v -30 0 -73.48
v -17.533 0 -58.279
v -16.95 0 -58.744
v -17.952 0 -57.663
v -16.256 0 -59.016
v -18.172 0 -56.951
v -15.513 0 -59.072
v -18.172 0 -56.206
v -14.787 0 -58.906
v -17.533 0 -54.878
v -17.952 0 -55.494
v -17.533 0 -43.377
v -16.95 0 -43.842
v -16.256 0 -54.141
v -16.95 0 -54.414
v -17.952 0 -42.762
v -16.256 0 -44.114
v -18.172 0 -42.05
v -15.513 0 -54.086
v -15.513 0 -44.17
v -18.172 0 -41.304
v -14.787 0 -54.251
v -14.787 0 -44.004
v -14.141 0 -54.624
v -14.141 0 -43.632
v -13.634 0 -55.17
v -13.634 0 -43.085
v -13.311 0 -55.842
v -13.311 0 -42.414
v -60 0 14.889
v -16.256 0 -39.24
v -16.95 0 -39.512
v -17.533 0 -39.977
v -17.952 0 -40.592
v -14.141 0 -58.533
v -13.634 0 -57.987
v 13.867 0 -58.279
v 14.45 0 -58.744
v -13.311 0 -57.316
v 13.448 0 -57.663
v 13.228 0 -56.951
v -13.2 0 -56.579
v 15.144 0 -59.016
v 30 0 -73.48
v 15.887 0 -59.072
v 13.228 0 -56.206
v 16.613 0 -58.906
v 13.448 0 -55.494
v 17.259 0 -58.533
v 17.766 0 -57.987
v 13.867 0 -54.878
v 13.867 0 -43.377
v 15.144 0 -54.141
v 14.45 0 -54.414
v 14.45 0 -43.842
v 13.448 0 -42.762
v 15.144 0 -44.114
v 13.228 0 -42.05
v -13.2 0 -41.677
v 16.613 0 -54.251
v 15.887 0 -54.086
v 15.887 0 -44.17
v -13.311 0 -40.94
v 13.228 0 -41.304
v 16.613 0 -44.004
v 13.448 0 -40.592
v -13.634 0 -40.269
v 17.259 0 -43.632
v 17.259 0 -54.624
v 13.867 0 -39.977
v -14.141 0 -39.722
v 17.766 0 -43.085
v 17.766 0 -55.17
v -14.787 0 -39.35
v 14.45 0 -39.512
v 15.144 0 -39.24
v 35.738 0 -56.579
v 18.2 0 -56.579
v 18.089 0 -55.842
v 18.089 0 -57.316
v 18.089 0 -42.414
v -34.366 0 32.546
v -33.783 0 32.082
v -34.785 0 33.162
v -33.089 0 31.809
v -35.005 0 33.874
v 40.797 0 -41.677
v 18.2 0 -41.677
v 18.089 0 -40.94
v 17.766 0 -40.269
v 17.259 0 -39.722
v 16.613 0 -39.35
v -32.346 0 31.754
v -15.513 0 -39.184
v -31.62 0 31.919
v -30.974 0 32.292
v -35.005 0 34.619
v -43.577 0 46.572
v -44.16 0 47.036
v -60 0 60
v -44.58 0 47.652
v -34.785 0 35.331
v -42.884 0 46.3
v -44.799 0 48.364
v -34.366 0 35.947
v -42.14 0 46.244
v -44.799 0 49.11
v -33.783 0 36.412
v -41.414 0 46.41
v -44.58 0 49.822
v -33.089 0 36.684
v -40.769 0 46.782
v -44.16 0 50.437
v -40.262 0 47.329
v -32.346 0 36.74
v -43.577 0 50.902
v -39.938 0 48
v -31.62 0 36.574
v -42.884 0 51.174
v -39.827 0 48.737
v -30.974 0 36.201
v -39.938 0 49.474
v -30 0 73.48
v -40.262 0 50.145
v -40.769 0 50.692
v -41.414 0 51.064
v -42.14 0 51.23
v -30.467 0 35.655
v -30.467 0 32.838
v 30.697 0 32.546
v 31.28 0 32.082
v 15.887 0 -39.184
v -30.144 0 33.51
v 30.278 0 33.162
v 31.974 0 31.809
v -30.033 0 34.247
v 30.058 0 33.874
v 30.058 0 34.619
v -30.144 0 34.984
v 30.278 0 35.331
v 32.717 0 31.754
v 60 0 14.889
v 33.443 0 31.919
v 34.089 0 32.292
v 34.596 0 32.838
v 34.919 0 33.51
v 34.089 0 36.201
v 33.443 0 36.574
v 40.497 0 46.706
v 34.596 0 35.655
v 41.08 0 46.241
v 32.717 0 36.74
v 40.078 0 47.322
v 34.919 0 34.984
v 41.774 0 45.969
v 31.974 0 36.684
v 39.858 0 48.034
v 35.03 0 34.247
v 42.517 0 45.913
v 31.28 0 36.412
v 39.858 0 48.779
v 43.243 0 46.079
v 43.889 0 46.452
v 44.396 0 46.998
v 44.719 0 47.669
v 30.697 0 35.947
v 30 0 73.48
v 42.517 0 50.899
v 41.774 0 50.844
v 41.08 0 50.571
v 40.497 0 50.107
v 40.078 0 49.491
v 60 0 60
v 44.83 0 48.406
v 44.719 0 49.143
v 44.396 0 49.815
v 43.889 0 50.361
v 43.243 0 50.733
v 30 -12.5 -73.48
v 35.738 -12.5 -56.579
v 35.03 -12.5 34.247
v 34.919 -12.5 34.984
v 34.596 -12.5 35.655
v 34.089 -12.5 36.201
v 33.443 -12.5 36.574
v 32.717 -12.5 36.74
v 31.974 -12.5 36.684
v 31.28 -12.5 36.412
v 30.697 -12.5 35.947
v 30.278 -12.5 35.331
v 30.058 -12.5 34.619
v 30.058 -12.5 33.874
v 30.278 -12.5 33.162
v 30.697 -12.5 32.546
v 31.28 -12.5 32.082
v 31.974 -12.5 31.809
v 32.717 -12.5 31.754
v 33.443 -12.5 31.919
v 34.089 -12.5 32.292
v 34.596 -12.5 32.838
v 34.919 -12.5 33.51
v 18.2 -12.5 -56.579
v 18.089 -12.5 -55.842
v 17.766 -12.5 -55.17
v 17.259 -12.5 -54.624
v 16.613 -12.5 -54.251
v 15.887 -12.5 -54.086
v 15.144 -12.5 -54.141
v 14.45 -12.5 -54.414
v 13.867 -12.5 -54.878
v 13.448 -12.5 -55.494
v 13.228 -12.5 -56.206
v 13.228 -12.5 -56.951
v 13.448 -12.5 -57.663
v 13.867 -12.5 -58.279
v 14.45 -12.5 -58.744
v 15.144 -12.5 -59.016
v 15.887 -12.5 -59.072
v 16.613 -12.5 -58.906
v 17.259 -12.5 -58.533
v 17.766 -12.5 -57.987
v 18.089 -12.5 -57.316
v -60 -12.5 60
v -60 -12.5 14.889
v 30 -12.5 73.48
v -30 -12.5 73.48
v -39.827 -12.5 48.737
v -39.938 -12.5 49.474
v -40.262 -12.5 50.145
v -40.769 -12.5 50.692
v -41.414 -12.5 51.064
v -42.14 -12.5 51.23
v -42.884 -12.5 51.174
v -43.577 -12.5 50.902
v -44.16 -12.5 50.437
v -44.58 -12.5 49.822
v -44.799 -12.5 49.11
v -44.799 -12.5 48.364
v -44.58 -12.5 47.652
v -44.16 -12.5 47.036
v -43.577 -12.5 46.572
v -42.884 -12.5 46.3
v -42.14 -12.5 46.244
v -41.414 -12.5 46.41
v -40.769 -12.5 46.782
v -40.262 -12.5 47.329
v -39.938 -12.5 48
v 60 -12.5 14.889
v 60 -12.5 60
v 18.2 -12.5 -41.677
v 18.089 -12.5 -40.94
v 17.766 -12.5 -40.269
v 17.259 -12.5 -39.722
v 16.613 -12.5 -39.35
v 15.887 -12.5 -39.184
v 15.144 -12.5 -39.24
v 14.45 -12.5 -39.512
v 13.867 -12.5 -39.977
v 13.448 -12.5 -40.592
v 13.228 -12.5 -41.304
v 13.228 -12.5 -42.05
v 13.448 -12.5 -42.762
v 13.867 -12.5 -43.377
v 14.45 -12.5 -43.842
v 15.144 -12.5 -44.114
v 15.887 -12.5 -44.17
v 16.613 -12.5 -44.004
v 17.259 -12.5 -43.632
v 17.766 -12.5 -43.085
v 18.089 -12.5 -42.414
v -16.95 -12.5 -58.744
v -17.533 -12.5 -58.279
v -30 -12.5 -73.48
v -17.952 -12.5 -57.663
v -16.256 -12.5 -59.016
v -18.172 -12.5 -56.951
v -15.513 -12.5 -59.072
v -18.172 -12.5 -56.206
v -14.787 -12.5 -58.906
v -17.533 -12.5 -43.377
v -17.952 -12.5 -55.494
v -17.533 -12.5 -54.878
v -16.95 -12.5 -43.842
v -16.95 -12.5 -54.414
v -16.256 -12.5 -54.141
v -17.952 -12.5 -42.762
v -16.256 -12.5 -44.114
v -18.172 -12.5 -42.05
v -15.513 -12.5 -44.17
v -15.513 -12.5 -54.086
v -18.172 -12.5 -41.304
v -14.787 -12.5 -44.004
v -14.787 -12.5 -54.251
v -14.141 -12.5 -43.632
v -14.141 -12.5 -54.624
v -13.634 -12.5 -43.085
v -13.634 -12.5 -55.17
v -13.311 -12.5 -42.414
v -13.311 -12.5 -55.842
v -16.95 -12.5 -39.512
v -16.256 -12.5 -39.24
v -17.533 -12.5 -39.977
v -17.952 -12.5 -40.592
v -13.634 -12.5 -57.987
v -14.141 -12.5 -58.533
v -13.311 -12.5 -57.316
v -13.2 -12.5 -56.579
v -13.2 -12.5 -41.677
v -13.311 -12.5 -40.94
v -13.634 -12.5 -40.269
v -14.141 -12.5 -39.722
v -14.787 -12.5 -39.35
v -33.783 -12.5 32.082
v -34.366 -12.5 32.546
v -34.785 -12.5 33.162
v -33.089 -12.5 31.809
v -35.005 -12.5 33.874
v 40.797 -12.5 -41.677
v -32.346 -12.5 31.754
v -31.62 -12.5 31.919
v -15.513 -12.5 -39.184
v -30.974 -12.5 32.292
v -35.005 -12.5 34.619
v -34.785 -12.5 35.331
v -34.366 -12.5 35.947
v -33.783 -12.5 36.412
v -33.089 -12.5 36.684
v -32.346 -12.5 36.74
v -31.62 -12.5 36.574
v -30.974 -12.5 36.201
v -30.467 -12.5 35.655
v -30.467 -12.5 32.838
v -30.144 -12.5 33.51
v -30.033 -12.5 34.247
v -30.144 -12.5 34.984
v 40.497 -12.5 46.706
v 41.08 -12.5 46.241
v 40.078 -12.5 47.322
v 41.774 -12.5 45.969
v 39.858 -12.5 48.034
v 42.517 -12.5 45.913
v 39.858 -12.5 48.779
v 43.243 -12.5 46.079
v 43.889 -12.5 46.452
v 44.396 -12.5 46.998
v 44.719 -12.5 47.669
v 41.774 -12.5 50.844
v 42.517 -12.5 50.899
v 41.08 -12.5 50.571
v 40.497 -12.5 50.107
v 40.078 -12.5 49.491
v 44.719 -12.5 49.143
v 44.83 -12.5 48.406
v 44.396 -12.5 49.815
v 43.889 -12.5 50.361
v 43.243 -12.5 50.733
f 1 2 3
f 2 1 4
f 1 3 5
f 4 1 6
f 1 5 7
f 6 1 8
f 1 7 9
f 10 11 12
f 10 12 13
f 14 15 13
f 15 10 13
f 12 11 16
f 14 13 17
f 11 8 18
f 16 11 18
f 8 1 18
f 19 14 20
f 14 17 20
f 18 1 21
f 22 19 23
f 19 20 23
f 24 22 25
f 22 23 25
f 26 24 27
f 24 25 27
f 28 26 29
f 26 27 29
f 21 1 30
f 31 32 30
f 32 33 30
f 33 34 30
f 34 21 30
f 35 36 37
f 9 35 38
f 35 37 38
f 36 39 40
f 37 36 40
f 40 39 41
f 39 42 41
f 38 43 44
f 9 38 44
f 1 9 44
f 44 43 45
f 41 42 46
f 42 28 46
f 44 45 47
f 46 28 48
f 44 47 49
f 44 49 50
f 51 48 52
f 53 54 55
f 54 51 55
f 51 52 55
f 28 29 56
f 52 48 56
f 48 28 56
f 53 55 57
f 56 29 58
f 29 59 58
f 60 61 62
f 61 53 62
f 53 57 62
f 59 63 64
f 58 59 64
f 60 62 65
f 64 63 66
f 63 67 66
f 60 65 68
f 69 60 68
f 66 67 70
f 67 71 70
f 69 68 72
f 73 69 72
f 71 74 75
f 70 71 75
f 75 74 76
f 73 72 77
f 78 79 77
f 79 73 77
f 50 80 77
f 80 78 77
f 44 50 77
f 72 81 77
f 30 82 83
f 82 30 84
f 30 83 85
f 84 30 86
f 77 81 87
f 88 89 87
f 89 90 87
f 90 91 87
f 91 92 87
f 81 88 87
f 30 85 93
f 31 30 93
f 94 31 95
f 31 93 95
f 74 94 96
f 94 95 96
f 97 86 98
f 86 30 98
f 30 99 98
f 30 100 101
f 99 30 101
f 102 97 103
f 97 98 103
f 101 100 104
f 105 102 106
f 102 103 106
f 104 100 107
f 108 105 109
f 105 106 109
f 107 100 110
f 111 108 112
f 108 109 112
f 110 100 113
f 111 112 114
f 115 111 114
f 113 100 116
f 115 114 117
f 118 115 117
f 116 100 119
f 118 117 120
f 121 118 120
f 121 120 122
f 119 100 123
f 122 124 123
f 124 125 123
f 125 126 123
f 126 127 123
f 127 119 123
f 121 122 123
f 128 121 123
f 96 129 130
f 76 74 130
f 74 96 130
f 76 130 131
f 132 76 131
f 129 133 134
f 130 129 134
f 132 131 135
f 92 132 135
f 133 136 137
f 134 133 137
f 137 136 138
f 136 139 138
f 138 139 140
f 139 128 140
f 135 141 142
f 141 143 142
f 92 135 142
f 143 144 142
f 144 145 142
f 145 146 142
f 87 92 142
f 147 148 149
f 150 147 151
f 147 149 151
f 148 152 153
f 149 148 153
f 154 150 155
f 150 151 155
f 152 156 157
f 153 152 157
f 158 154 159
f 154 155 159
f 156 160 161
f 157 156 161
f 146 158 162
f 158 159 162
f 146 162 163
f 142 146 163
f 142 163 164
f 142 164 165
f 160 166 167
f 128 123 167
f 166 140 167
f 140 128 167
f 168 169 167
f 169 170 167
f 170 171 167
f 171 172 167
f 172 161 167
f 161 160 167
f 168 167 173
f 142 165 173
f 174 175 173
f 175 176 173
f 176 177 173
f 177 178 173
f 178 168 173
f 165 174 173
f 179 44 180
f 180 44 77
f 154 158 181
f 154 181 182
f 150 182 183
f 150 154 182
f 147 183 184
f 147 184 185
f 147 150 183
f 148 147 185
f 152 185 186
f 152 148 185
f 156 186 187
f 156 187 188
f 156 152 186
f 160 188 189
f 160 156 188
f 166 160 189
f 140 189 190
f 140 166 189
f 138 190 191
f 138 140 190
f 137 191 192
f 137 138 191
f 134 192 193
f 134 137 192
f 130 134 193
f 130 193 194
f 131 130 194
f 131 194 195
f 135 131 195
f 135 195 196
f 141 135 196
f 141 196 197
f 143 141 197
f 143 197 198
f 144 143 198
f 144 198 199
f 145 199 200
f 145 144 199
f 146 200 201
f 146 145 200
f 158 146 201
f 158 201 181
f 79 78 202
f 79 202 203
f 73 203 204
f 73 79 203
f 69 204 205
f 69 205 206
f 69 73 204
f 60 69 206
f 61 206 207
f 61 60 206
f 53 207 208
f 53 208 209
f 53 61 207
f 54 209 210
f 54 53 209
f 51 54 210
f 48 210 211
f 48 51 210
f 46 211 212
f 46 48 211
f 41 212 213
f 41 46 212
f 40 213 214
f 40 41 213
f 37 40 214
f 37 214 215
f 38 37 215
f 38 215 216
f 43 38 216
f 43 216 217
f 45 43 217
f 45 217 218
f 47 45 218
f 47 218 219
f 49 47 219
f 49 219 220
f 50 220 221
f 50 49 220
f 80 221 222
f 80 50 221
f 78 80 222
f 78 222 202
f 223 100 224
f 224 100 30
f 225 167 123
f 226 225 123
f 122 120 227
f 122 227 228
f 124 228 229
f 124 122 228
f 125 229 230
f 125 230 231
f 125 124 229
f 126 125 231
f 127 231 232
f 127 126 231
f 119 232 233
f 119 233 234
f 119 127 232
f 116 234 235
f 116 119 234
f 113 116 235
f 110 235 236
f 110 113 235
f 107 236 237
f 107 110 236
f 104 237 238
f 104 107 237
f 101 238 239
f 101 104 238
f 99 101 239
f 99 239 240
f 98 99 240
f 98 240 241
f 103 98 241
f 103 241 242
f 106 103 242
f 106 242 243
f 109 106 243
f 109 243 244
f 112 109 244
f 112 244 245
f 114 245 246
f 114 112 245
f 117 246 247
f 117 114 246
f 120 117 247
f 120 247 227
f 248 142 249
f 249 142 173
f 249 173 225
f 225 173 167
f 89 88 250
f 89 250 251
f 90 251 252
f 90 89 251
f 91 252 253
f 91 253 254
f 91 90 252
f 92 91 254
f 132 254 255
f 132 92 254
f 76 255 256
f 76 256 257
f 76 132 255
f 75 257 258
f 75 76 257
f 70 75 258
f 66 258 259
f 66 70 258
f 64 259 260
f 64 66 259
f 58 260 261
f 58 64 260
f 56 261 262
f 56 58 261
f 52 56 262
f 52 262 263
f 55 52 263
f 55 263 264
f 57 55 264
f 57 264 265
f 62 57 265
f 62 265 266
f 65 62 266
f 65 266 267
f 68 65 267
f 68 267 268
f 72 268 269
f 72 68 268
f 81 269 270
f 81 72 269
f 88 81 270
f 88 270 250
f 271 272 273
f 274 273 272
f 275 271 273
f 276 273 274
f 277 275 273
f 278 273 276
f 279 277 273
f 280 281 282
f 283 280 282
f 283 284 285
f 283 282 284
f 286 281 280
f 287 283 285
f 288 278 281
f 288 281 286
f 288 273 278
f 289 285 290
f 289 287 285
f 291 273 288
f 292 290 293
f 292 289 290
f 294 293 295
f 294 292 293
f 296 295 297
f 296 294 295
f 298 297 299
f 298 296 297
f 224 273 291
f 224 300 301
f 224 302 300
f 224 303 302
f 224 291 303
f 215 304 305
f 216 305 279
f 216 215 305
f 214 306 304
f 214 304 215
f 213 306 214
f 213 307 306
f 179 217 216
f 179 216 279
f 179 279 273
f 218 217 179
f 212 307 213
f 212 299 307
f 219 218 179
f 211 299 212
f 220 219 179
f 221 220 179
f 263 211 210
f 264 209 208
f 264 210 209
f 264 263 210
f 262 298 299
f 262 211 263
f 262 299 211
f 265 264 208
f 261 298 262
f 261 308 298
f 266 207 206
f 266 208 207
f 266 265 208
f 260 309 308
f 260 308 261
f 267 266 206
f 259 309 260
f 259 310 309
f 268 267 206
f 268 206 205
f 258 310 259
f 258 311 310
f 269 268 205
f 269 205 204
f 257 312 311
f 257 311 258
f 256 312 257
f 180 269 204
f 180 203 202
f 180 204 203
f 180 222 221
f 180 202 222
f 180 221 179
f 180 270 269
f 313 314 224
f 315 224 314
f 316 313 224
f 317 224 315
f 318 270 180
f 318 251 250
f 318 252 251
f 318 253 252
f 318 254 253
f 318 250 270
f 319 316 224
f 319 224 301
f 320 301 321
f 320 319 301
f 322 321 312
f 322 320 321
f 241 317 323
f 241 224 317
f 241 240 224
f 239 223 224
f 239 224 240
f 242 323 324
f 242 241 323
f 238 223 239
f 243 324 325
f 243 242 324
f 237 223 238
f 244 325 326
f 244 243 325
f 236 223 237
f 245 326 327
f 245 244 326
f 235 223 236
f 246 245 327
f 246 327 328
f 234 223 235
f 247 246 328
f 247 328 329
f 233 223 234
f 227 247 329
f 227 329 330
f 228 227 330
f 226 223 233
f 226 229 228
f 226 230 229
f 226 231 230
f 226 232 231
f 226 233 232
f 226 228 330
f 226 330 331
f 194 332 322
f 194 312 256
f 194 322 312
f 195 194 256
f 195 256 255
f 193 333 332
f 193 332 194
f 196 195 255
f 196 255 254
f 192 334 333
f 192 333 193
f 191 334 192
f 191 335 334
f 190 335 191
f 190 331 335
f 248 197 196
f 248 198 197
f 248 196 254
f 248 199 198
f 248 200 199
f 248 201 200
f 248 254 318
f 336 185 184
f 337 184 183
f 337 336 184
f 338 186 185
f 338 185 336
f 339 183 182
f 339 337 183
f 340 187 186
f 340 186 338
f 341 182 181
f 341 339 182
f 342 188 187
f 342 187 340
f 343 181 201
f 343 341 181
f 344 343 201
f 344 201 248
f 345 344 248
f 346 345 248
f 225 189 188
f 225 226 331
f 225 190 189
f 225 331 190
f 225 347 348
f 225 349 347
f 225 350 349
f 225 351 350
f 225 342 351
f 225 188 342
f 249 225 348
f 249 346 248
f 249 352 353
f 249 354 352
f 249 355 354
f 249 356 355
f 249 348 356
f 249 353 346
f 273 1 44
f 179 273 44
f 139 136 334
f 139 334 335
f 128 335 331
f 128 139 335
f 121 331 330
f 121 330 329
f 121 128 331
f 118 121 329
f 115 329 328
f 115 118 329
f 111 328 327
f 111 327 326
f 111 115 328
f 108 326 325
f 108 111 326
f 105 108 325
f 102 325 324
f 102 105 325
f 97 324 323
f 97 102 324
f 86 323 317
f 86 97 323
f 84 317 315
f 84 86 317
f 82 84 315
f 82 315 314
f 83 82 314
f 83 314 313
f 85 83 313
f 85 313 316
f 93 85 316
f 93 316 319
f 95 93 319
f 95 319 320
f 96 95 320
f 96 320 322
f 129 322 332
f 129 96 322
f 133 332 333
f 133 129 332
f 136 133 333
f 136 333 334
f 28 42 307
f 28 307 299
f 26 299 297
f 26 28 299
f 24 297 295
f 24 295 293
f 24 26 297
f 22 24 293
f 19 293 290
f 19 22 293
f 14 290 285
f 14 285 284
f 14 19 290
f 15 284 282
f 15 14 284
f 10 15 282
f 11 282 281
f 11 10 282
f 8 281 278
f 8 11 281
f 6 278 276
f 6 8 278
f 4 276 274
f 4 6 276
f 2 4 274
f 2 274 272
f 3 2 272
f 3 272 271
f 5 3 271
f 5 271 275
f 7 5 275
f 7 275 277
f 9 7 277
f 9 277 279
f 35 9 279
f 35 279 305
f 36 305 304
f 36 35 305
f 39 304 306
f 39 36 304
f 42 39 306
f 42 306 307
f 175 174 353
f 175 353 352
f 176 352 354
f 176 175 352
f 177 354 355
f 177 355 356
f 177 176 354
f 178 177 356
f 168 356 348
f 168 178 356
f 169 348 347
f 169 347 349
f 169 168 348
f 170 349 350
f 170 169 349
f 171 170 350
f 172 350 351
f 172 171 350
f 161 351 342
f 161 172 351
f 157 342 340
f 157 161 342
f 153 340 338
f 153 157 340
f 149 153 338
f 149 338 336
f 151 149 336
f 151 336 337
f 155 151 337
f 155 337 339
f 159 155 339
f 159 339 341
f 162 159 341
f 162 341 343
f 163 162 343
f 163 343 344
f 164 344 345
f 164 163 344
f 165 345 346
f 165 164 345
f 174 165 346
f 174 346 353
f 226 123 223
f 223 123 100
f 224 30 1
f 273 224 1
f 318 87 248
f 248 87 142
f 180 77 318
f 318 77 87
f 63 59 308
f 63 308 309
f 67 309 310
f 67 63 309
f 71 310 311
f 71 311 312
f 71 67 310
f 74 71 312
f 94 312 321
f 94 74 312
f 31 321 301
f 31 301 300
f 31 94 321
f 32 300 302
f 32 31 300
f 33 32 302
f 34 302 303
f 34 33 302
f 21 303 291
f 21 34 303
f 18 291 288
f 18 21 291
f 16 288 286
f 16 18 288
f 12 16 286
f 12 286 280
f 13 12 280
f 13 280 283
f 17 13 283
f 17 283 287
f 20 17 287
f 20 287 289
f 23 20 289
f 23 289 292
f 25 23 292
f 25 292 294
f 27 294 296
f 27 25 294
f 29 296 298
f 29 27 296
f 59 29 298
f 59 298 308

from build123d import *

# Parameters (mm, degrees)
F0_R     = 2.5
F1_DEPTH = 12.5


with BuildPart() as f1:
    # F0 (on Front) → F1 (new body)
    with BuildSketch(Plane.XZ):
        Polygon((30, 73.480435), (-30, 73.480435), (-60, 60), (-60, 14.888939), (-30, -73.480435), (30, -73.480435), (35.737889, -56.578646), (40.796766, -41.676988), (60, 14.888939), (60, 60), align=None)
        with Locations((-15.7, -56.578646)):
            Circle(F0_R, mode=Mode.SUBTRACT)
        with Locations((-15.7, -41.676988)):
            Circle(F0_R, mode=Mode.SUBTRACT)
        with Locations((15.7, -56.578646)):
            Circle(F0_R, mode=Mode.SUBTRACT)
        with Locations((15.7, -41.676988)):
            Circle(F0_R, mode=Mode.SUBTRACT)
        with Locations((-32.532971, 34.246657)):
            Circle(F0_R, mode=Mode.SUBTRACT)
        with Locations((-42.327315, 48.736922)):
            Circle(F0_R, mode=Mode.SUBTRACT)
        with Locations((32.53, 34.246657)):
            Circle(F0_R, mode=Mode.SUBTRACT)
        with Locations((42.33, 48.406292)):
            Circle(F0_R, mode=Mode.SUBTRACT)
    extrude(amount=F1_DEPTH)


solid = f1.part
